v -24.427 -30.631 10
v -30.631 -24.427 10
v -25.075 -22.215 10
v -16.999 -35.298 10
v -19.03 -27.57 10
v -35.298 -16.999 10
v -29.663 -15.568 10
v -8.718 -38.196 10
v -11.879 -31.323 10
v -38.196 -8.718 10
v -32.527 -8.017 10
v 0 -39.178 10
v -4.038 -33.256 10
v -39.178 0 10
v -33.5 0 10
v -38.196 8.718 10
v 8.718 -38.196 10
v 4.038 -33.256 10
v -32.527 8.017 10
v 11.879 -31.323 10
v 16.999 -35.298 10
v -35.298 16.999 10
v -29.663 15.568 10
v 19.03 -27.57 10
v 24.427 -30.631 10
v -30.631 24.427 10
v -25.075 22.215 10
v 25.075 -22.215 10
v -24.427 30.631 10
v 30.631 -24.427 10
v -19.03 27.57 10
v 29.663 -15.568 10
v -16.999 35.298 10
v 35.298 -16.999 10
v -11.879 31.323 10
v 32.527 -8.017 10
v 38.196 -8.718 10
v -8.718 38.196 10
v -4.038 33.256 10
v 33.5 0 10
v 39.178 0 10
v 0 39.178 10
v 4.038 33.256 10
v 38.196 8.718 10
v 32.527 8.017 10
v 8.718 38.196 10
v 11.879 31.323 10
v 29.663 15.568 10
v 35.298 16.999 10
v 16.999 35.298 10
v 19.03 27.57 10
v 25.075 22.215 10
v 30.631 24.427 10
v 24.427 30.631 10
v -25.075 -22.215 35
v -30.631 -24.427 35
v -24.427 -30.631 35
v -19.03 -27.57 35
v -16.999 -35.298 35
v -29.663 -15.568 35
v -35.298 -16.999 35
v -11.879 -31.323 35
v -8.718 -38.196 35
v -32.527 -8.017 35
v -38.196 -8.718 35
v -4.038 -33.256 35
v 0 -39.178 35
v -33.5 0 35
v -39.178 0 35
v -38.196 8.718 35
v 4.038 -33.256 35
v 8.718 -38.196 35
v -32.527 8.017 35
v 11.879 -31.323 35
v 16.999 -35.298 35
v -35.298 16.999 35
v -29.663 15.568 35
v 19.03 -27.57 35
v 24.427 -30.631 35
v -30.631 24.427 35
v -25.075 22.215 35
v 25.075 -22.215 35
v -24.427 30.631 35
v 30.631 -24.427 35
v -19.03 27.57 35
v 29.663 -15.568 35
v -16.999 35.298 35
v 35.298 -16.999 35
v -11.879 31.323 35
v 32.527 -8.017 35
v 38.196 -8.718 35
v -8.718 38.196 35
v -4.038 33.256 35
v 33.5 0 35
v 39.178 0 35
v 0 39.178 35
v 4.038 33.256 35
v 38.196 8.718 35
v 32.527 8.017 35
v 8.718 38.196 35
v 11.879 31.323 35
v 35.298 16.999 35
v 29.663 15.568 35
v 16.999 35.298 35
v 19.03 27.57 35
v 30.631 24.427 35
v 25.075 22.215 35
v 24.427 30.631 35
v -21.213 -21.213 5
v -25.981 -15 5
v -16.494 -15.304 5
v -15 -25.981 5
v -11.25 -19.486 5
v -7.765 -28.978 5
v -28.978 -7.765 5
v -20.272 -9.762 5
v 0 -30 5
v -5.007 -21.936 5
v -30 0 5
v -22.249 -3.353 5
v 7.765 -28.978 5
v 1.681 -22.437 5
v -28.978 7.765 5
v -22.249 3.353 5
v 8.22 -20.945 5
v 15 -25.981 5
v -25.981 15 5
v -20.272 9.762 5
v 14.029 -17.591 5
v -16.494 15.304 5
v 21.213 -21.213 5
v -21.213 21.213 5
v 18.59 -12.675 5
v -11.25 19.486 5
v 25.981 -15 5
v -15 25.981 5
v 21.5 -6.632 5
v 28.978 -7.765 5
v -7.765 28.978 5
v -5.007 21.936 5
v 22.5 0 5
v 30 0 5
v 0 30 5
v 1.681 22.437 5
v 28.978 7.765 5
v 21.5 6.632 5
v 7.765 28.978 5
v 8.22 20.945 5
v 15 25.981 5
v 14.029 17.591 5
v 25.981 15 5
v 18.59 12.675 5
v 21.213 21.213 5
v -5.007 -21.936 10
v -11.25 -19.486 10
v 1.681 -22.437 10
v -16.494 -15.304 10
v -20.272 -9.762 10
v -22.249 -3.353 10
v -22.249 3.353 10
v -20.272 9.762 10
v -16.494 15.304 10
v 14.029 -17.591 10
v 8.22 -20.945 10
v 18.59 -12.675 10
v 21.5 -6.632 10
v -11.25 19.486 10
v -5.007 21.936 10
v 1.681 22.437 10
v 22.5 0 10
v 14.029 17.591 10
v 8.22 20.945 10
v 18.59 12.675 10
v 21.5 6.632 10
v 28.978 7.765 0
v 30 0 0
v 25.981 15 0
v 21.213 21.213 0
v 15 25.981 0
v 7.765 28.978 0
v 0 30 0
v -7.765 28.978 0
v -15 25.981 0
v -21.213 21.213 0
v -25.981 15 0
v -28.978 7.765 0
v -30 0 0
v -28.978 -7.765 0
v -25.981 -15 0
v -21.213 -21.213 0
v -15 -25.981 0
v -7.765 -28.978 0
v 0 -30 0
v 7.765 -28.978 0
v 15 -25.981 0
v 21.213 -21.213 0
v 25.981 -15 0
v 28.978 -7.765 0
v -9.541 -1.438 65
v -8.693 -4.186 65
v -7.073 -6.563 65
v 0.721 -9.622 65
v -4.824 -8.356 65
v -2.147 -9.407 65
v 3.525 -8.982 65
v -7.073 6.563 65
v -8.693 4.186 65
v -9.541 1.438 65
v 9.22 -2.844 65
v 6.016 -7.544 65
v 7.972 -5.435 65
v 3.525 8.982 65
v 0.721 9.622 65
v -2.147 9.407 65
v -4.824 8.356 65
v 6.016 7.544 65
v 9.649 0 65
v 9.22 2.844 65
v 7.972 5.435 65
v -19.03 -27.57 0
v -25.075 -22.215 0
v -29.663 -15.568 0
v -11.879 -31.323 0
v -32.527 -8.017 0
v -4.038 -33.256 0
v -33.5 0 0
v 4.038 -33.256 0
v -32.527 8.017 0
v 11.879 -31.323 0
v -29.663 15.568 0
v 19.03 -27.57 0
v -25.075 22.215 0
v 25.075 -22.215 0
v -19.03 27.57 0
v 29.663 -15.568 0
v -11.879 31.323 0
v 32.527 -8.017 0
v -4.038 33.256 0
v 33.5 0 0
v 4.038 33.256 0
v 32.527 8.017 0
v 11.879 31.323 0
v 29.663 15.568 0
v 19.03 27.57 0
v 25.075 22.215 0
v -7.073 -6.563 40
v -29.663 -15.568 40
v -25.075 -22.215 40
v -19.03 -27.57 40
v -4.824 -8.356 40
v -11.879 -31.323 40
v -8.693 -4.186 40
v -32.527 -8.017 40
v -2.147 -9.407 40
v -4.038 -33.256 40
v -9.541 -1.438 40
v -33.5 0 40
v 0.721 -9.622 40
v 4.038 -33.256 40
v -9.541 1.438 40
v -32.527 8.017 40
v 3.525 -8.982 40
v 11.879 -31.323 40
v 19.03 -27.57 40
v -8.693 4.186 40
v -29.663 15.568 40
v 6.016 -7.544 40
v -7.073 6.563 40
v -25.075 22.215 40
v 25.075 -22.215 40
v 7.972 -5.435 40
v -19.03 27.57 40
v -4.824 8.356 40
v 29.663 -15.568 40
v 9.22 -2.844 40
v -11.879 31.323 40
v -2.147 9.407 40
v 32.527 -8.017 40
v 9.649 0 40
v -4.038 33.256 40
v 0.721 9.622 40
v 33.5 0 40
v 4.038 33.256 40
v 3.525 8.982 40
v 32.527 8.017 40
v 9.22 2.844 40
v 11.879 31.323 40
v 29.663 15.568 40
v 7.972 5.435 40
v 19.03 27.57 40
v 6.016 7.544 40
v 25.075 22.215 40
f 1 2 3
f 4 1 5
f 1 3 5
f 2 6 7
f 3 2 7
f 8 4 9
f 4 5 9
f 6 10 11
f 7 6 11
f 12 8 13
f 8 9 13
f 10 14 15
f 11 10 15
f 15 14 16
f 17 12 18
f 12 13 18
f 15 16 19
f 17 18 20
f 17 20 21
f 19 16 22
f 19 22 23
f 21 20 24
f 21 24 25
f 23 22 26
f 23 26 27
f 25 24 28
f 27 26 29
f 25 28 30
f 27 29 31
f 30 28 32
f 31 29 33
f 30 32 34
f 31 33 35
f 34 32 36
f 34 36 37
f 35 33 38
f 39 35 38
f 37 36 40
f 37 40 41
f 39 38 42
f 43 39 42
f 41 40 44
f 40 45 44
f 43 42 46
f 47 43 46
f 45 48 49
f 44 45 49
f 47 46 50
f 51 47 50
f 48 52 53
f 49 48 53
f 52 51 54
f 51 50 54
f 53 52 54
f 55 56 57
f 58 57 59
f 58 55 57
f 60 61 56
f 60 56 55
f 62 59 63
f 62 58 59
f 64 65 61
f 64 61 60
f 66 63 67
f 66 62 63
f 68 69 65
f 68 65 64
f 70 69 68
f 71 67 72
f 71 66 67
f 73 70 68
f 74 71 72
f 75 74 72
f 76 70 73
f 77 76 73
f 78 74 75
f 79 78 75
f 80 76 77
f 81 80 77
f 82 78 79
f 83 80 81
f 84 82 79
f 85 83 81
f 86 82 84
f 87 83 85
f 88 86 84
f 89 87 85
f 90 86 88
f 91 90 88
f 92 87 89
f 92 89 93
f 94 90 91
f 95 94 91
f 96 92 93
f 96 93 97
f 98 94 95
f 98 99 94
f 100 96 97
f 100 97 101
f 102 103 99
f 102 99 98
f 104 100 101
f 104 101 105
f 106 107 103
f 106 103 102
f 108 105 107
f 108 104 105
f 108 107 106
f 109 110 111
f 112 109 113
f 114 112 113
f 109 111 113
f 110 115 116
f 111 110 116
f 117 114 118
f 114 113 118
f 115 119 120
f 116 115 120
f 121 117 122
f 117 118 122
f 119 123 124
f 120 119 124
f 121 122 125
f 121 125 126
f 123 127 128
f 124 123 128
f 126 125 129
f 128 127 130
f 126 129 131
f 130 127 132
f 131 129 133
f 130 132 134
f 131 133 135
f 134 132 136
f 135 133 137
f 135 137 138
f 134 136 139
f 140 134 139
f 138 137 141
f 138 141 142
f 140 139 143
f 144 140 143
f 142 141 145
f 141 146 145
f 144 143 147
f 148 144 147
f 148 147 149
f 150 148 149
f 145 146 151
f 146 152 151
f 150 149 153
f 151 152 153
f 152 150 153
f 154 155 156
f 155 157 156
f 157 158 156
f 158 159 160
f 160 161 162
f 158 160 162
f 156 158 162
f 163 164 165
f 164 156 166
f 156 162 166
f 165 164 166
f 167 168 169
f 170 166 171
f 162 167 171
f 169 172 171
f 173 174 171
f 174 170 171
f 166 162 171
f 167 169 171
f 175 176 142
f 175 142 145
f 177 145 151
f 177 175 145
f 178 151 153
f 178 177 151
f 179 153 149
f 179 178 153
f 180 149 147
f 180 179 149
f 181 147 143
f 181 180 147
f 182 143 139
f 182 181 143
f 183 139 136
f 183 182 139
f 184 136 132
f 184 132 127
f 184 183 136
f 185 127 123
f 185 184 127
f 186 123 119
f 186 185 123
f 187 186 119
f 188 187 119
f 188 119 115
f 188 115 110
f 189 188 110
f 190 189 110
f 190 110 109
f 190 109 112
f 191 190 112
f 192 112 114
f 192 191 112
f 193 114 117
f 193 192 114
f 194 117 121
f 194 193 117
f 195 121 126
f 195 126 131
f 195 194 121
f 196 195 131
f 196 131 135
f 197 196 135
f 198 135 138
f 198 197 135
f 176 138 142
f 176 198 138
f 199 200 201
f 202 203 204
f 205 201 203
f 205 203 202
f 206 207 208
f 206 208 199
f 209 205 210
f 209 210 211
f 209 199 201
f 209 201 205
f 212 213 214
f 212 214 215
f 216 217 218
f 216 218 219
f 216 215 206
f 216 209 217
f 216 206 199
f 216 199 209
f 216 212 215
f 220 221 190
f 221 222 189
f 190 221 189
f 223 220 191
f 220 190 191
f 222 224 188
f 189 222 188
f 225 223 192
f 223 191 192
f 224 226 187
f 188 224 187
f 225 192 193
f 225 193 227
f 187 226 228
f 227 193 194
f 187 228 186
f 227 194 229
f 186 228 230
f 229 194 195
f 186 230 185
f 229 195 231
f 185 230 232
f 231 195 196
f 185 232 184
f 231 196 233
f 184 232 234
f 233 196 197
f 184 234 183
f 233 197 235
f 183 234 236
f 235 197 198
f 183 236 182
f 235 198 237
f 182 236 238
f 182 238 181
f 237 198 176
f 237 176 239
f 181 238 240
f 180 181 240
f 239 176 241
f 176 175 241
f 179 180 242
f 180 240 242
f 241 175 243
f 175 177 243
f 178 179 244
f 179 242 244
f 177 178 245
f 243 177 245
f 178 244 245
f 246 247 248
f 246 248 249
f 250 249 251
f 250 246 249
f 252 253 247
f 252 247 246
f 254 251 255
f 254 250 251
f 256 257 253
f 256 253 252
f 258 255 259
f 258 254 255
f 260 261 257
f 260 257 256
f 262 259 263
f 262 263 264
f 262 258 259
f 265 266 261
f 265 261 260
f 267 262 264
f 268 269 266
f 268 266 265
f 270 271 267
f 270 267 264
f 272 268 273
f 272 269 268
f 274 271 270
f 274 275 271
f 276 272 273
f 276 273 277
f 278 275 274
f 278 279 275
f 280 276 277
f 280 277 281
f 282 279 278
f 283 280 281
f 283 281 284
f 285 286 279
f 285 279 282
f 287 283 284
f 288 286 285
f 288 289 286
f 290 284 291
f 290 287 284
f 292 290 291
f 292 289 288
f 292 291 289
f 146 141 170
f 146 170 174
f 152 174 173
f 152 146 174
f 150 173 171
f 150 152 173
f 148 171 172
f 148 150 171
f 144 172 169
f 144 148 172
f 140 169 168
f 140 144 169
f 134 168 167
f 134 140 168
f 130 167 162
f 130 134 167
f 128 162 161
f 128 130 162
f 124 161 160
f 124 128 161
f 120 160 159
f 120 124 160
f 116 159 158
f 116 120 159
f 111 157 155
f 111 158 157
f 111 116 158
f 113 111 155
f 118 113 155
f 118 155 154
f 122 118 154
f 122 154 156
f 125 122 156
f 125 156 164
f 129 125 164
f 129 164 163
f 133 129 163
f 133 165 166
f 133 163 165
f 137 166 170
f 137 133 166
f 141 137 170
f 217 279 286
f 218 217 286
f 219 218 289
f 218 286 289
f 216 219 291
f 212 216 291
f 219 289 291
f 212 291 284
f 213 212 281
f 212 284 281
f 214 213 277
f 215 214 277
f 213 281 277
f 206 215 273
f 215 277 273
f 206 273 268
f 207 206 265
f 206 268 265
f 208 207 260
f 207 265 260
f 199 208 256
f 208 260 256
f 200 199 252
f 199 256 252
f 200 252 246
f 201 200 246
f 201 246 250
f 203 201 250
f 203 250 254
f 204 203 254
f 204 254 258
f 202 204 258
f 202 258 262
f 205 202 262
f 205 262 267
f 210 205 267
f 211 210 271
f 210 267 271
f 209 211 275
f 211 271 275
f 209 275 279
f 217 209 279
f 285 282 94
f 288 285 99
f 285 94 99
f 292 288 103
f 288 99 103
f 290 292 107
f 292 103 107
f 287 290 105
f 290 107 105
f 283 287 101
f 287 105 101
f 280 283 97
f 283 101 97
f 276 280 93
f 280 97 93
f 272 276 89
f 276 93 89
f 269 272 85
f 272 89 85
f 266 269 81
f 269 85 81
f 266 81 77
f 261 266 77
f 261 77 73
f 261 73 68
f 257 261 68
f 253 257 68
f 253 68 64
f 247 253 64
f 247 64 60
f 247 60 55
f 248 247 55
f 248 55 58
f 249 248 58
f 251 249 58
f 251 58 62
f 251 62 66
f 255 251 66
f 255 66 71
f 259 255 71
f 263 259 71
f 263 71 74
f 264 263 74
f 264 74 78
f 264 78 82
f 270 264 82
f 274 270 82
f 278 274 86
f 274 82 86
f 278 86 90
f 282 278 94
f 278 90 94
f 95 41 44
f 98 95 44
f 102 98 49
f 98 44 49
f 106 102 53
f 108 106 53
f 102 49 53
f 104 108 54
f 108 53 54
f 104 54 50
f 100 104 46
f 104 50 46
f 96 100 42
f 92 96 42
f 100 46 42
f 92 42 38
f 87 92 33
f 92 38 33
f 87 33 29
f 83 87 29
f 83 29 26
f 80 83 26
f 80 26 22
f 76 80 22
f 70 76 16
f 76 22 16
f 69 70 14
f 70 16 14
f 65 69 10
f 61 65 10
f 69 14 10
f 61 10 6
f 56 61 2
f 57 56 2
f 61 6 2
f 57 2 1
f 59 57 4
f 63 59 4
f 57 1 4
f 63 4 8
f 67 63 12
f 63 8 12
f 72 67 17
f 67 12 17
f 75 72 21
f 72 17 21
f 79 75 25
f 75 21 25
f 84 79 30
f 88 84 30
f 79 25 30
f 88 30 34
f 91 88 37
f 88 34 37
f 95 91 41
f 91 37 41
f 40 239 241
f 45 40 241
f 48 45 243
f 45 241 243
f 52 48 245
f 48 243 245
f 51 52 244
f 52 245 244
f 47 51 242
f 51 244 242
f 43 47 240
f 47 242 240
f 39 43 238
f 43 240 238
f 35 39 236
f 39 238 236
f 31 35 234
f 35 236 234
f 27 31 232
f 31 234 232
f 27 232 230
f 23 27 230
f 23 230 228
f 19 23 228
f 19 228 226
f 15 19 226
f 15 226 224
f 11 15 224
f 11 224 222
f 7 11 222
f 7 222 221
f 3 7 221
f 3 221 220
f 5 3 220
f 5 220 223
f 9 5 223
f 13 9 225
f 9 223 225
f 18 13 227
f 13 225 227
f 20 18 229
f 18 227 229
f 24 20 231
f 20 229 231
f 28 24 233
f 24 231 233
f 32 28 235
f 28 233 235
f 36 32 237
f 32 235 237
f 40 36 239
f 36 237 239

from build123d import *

# Parameters (mm, degrees)
F0_R      = 33.5
F0_R_2    = 30
F1_DEPTH  = 40
F2_DEPTH  = 5
F4_R      = 22.5
F5_DEPTH  = 15
F6_R      = 9.648843
F7_DEPTH  = 25
F9_R      = 39.178288
F10_DEPTH = 25


with BuildPart() as f1:
    # F0 (on Top) → F1 (new body)
    with BuildSketch(Plane.XY):
        Circle(F0_R)
        Circle(F0_R_2, mode=Mode.SUBTRACT)
        Circle(F0_R_2)
    extrude(amount=F1_DEPTH)

    # F0 (on Top) → F2 (cut)
    with BuildSketch(Plane.XY):
        Circle(F0_R_2)
    extrude(amount=F2_DEPTH, mode=Mode.SUBTRACT)

    # F4 (on face) → F5 (cut)
    with BuildSketch(Plane.XY):
        Circle(F4_R)
    extrude(amount=F5_DEPTH, mode=Mode.SUBTRACT)

    # F6 (on face) → F7 (join)
    with BuildSketch(Plane.XY.offset(40)):
        Circle(F6_R)
    extrude(amount=F7_DEPTH)

    # F9 (on offset) → F10 (join)
    with BuildSketch(Plane.XY.offset(10)):
        Circle(F9_R)
    extrude(amount=F10_DEPTH)


solid = f1.part
